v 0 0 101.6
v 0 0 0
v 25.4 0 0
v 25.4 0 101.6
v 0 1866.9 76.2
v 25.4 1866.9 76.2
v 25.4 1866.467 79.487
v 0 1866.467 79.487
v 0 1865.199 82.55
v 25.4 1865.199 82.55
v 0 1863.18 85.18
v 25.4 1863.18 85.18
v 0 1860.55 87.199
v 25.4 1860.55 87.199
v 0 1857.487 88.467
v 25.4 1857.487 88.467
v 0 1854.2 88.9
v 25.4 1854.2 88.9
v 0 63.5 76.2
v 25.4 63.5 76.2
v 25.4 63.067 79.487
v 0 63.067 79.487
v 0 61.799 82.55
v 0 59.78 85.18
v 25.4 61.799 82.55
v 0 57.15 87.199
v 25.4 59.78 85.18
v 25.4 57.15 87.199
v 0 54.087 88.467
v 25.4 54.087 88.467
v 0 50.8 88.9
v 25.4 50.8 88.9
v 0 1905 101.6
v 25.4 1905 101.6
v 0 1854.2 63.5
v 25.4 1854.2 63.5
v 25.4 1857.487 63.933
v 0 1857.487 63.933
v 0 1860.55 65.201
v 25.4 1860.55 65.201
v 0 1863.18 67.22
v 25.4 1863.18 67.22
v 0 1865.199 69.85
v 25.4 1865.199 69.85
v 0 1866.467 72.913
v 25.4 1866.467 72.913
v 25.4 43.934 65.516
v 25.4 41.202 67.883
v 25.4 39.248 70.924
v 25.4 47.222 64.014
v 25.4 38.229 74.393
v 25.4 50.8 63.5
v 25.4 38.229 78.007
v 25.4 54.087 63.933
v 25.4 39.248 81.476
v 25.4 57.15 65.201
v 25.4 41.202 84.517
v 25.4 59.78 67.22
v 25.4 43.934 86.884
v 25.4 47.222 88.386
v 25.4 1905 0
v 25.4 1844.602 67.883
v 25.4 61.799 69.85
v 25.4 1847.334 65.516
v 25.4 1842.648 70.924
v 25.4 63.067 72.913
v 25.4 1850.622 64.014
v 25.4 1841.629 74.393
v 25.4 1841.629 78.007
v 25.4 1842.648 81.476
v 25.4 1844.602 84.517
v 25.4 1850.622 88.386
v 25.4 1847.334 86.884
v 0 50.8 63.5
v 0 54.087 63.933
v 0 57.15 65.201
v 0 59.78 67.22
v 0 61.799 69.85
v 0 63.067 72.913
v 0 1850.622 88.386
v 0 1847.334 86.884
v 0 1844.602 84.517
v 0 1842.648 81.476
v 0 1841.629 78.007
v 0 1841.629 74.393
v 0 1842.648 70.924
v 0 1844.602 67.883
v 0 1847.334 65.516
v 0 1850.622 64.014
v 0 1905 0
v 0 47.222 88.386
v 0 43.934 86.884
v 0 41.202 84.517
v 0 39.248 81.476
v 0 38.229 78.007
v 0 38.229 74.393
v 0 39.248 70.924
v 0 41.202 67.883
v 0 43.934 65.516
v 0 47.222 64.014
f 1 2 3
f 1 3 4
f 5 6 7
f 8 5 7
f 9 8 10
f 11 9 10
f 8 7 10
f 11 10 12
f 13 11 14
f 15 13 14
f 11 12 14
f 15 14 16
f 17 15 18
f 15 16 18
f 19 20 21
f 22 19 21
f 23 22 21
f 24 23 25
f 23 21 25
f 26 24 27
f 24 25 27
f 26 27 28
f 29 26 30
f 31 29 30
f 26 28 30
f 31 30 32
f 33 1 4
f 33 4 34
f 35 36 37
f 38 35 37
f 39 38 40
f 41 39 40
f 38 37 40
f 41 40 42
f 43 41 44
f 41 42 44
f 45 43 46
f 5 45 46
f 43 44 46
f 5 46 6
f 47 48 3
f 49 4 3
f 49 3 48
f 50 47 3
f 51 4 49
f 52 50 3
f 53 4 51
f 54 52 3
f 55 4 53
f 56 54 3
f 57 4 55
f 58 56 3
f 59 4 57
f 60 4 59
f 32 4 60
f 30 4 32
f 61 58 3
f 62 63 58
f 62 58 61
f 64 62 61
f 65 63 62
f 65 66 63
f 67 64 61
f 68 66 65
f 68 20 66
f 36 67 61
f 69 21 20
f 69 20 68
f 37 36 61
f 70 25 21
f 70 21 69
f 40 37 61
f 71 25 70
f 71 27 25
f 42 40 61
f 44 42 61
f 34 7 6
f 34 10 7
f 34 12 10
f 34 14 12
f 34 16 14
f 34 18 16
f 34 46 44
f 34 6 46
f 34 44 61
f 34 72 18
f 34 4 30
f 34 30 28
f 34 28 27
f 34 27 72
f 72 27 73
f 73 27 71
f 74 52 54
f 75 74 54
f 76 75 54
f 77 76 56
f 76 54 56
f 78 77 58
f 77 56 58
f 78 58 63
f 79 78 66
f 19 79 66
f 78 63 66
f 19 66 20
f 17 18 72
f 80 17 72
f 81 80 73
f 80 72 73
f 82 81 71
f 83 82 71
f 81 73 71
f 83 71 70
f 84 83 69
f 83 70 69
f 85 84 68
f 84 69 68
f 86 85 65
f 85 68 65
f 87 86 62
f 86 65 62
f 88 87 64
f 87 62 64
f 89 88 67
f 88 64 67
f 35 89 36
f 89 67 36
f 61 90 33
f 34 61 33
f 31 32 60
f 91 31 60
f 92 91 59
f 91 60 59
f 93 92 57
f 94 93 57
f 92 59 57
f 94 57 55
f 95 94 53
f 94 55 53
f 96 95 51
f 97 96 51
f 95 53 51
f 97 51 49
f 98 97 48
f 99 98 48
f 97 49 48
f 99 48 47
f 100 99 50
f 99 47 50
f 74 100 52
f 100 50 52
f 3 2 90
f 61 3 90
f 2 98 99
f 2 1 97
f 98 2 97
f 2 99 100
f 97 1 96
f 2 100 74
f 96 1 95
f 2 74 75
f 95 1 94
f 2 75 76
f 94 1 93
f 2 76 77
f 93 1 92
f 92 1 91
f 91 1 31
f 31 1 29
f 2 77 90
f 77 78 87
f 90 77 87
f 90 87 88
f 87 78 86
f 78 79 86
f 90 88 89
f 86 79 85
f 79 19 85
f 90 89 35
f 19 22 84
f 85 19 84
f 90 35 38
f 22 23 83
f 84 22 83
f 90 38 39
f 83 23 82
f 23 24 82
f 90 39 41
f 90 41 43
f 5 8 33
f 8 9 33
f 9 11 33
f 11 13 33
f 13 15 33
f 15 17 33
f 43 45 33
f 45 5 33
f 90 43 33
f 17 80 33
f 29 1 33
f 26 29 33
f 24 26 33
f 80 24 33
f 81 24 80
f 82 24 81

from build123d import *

# Parameters (mm, degrees)
F0_W     = 1905
F0_H     = 101.6
F1_DEPTH = 25.4
F3_DEPTH = 25.401


with BuildPart() as f1:
    # F0 (on Right) → F1 (new body)
    with BuildSketch(Plane.YZ):
        with Locations((952.5, 50.8)):
            Rectangle(F0_W, F0_H)
    extrude(amount=F1_DEPTH)

    # F2 (on face) → F3 (cut, through all)
    with BuildSketch(Plane.YZ.offset(25.4)):
        with BuildLine():
            ThreePointArc((63.5, 76.2), (59.780256, 85.180256), (50.8, 88.9))
            Line((50.8, 88.9), (50.8, 63.5))
            ThreePointArc((50.8, 63.5), (59.780256, 67.219744), (63.5, 76.2))
        make_face()
        with BuildLine():
            Line((50.8, 63.5), (50.8, 88.9))
            ThreePointArc((50.8, 88.9), (38.1, 76.2), (50.8, 63.5))
        make_face()
        with BuildLine():
            ThreePointArc((1866.9, 76.2), (1863.180256, 85.180256), (1854.2, 88.9))
            Line((1854.2, 88.9), (1854.2, 63.5))
            ThreePointArc((1854.2, 63.5), (1863.180256, 67.219744), (1866.9, 76.2))
        make_face()
        with BuildLine():
            Line((1854.2, 63.5), (1854.2, 88.9))
            ThreePointArc((1854.2, 88.9), (1841.5, 76.2), (1854.2, 63.5))
        make_face()
    extrude(amount=-F3_DEPTH, mode=Mode.SUBTRACT)


solid = f1.part
